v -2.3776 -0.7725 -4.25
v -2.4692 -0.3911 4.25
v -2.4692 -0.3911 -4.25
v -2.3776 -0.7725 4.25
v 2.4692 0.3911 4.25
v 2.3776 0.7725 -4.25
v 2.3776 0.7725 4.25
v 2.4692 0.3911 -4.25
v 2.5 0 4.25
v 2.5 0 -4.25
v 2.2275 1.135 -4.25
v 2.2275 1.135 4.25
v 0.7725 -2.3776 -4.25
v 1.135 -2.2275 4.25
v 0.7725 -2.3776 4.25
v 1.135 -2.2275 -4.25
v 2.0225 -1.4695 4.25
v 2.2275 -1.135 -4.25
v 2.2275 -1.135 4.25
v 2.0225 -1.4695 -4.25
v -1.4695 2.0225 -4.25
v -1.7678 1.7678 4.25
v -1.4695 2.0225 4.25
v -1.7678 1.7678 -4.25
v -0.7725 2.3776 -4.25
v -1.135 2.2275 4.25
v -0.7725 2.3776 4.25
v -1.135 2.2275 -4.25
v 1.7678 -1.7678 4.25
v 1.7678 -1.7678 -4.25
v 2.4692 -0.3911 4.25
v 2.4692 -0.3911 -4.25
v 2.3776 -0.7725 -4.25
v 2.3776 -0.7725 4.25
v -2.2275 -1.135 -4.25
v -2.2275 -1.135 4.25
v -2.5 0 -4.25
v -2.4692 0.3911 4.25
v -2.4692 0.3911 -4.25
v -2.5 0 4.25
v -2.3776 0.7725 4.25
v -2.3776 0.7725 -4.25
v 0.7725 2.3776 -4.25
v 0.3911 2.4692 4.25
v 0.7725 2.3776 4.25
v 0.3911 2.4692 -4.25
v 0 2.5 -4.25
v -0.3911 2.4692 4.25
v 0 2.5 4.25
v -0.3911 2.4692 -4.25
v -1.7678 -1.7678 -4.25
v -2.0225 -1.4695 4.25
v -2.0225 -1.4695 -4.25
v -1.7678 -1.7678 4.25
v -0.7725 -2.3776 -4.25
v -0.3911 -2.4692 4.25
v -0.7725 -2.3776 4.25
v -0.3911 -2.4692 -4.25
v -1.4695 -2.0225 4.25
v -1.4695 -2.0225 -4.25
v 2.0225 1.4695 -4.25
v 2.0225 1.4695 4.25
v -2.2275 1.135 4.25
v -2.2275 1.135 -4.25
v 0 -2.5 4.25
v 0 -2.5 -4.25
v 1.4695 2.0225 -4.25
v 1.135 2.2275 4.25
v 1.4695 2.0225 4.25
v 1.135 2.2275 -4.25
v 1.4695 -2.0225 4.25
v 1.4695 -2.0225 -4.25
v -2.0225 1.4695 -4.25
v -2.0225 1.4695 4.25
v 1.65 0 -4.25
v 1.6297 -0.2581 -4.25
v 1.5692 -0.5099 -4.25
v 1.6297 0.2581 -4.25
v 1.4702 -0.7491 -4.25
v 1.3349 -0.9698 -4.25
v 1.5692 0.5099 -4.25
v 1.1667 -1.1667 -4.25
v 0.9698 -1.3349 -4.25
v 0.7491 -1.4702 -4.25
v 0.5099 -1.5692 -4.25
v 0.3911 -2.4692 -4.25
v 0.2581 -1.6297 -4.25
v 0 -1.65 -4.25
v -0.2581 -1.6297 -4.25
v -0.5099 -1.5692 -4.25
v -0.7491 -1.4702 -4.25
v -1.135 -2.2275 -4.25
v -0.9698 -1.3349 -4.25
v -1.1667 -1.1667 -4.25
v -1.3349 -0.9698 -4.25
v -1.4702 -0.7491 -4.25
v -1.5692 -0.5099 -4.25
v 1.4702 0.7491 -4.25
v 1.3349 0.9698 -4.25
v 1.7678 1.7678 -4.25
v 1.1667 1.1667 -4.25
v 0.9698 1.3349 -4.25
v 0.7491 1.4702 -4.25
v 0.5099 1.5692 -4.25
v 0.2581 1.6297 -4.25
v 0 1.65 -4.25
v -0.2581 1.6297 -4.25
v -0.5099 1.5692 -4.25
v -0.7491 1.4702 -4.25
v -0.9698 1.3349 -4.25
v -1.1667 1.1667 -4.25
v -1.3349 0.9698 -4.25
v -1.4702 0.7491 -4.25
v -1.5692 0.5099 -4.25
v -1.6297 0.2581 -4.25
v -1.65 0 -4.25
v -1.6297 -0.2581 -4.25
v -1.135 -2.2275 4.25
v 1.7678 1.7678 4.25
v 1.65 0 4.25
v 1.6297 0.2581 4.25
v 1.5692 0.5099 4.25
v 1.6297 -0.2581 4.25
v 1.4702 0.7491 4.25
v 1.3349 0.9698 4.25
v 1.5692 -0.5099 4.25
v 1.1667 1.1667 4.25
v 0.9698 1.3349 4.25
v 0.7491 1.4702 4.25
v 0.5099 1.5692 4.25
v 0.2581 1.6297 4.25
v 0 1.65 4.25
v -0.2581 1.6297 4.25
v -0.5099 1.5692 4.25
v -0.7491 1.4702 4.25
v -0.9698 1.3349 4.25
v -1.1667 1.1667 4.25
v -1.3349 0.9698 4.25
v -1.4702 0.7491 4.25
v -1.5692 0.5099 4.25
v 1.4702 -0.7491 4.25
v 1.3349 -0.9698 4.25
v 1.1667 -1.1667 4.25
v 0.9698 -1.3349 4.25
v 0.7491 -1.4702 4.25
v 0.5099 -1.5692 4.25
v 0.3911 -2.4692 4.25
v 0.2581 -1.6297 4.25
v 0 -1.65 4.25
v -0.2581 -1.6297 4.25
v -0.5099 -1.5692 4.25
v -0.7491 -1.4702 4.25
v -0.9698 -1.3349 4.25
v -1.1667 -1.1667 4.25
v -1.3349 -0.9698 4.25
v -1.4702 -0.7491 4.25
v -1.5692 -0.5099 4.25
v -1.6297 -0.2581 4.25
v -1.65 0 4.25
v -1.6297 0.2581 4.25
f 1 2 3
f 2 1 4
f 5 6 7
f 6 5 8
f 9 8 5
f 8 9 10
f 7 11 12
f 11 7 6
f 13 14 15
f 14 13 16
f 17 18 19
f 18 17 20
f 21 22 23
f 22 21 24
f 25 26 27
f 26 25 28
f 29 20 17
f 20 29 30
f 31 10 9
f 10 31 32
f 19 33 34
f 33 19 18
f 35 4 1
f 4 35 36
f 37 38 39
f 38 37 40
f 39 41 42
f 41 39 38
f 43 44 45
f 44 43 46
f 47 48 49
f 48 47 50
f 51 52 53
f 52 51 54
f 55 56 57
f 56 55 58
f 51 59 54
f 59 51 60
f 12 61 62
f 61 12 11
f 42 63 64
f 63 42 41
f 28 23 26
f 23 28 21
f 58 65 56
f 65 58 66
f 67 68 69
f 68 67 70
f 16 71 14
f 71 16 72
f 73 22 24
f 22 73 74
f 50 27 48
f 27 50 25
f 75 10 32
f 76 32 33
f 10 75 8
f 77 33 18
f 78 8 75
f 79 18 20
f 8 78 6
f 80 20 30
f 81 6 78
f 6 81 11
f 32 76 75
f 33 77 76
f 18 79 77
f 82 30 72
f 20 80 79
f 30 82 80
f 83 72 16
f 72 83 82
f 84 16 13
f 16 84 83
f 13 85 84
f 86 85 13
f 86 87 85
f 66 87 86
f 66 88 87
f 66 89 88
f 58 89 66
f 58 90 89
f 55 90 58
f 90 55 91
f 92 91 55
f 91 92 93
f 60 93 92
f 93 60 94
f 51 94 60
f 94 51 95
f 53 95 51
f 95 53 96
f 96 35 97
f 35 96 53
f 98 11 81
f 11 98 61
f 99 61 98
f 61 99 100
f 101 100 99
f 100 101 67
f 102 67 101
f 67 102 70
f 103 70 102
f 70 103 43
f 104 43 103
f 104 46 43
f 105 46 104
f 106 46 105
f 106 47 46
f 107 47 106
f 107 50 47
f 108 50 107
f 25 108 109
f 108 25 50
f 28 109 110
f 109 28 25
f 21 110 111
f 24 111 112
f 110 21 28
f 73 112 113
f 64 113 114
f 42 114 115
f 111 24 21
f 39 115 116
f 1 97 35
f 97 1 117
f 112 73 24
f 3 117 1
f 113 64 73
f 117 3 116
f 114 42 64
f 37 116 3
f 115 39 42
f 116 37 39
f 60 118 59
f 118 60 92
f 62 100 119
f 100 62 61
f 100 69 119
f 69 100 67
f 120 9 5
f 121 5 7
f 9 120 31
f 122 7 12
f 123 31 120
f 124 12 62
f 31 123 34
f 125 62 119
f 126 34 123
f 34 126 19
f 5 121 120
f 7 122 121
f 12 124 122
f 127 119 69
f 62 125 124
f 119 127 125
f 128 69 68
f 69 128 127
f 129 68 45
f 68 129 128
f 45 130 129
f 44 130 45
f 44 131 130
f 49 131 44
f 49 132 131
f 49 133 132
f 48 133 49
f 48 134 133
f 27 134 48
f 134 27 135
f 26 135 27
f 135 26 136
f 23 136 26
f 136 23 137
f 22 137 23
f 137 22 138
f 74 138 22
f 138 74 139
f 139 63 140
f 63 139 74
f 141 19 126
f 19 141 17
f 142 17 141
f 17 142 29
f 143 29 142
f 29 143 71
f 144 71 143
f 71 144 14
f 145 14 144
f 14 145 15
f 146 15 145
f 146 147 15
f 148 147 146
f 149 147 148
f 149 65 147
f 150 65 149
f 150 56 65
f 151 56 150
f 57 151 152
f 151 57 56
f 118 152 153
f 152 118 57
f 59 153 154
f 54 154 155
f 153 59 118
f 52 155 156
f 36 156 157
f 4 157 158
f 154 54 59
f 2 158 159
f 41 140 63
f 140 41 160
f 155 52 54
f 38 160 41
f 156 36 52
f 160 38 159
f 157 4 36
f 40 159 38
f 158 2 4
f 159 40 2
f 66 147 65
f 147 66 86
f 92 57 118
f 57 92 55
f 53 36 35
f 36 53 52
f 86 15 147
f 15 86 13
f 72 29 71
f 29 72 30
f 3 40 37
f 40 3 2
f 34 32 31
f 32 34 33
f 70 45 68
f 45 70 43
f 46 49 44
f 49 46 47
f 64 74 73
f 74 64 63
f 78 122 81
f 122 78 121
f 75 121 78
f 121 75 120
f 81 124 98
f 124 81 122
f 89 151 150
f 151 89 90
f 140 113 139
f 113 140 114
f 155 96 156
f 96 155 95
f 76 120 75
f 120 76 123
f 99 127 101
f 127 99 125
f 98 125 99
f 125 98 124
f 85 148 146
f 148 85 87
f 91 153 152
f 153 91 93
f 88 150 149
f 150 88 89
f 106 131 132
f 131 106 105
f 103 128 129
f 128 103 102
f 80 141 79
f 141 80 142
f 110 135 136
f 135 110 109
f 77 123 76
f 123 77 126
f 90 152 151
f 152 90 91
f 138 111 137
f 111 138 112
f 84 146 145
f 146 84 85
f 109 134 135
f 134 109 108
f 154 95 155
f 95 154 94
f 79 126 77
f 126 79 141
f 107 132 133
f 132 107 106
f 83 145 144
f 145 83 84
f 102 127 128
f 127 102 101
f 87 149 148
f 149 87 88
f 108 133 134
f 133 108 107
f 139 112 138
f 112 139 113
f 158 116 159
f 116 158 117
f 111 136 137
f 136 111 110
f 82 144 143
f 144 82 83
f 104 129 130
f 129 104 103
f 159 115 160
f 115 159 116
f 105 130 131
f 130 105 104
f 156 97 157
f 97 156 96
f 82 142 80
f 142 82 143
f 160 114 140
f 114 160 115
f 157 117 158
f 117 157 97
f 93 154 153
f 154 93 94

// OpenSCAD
$fn = 40;
difference() {
   cylinder(h=8.5, d=5, center=true);
   cylinder(h=8.5, d=3.3, center=true);
}
